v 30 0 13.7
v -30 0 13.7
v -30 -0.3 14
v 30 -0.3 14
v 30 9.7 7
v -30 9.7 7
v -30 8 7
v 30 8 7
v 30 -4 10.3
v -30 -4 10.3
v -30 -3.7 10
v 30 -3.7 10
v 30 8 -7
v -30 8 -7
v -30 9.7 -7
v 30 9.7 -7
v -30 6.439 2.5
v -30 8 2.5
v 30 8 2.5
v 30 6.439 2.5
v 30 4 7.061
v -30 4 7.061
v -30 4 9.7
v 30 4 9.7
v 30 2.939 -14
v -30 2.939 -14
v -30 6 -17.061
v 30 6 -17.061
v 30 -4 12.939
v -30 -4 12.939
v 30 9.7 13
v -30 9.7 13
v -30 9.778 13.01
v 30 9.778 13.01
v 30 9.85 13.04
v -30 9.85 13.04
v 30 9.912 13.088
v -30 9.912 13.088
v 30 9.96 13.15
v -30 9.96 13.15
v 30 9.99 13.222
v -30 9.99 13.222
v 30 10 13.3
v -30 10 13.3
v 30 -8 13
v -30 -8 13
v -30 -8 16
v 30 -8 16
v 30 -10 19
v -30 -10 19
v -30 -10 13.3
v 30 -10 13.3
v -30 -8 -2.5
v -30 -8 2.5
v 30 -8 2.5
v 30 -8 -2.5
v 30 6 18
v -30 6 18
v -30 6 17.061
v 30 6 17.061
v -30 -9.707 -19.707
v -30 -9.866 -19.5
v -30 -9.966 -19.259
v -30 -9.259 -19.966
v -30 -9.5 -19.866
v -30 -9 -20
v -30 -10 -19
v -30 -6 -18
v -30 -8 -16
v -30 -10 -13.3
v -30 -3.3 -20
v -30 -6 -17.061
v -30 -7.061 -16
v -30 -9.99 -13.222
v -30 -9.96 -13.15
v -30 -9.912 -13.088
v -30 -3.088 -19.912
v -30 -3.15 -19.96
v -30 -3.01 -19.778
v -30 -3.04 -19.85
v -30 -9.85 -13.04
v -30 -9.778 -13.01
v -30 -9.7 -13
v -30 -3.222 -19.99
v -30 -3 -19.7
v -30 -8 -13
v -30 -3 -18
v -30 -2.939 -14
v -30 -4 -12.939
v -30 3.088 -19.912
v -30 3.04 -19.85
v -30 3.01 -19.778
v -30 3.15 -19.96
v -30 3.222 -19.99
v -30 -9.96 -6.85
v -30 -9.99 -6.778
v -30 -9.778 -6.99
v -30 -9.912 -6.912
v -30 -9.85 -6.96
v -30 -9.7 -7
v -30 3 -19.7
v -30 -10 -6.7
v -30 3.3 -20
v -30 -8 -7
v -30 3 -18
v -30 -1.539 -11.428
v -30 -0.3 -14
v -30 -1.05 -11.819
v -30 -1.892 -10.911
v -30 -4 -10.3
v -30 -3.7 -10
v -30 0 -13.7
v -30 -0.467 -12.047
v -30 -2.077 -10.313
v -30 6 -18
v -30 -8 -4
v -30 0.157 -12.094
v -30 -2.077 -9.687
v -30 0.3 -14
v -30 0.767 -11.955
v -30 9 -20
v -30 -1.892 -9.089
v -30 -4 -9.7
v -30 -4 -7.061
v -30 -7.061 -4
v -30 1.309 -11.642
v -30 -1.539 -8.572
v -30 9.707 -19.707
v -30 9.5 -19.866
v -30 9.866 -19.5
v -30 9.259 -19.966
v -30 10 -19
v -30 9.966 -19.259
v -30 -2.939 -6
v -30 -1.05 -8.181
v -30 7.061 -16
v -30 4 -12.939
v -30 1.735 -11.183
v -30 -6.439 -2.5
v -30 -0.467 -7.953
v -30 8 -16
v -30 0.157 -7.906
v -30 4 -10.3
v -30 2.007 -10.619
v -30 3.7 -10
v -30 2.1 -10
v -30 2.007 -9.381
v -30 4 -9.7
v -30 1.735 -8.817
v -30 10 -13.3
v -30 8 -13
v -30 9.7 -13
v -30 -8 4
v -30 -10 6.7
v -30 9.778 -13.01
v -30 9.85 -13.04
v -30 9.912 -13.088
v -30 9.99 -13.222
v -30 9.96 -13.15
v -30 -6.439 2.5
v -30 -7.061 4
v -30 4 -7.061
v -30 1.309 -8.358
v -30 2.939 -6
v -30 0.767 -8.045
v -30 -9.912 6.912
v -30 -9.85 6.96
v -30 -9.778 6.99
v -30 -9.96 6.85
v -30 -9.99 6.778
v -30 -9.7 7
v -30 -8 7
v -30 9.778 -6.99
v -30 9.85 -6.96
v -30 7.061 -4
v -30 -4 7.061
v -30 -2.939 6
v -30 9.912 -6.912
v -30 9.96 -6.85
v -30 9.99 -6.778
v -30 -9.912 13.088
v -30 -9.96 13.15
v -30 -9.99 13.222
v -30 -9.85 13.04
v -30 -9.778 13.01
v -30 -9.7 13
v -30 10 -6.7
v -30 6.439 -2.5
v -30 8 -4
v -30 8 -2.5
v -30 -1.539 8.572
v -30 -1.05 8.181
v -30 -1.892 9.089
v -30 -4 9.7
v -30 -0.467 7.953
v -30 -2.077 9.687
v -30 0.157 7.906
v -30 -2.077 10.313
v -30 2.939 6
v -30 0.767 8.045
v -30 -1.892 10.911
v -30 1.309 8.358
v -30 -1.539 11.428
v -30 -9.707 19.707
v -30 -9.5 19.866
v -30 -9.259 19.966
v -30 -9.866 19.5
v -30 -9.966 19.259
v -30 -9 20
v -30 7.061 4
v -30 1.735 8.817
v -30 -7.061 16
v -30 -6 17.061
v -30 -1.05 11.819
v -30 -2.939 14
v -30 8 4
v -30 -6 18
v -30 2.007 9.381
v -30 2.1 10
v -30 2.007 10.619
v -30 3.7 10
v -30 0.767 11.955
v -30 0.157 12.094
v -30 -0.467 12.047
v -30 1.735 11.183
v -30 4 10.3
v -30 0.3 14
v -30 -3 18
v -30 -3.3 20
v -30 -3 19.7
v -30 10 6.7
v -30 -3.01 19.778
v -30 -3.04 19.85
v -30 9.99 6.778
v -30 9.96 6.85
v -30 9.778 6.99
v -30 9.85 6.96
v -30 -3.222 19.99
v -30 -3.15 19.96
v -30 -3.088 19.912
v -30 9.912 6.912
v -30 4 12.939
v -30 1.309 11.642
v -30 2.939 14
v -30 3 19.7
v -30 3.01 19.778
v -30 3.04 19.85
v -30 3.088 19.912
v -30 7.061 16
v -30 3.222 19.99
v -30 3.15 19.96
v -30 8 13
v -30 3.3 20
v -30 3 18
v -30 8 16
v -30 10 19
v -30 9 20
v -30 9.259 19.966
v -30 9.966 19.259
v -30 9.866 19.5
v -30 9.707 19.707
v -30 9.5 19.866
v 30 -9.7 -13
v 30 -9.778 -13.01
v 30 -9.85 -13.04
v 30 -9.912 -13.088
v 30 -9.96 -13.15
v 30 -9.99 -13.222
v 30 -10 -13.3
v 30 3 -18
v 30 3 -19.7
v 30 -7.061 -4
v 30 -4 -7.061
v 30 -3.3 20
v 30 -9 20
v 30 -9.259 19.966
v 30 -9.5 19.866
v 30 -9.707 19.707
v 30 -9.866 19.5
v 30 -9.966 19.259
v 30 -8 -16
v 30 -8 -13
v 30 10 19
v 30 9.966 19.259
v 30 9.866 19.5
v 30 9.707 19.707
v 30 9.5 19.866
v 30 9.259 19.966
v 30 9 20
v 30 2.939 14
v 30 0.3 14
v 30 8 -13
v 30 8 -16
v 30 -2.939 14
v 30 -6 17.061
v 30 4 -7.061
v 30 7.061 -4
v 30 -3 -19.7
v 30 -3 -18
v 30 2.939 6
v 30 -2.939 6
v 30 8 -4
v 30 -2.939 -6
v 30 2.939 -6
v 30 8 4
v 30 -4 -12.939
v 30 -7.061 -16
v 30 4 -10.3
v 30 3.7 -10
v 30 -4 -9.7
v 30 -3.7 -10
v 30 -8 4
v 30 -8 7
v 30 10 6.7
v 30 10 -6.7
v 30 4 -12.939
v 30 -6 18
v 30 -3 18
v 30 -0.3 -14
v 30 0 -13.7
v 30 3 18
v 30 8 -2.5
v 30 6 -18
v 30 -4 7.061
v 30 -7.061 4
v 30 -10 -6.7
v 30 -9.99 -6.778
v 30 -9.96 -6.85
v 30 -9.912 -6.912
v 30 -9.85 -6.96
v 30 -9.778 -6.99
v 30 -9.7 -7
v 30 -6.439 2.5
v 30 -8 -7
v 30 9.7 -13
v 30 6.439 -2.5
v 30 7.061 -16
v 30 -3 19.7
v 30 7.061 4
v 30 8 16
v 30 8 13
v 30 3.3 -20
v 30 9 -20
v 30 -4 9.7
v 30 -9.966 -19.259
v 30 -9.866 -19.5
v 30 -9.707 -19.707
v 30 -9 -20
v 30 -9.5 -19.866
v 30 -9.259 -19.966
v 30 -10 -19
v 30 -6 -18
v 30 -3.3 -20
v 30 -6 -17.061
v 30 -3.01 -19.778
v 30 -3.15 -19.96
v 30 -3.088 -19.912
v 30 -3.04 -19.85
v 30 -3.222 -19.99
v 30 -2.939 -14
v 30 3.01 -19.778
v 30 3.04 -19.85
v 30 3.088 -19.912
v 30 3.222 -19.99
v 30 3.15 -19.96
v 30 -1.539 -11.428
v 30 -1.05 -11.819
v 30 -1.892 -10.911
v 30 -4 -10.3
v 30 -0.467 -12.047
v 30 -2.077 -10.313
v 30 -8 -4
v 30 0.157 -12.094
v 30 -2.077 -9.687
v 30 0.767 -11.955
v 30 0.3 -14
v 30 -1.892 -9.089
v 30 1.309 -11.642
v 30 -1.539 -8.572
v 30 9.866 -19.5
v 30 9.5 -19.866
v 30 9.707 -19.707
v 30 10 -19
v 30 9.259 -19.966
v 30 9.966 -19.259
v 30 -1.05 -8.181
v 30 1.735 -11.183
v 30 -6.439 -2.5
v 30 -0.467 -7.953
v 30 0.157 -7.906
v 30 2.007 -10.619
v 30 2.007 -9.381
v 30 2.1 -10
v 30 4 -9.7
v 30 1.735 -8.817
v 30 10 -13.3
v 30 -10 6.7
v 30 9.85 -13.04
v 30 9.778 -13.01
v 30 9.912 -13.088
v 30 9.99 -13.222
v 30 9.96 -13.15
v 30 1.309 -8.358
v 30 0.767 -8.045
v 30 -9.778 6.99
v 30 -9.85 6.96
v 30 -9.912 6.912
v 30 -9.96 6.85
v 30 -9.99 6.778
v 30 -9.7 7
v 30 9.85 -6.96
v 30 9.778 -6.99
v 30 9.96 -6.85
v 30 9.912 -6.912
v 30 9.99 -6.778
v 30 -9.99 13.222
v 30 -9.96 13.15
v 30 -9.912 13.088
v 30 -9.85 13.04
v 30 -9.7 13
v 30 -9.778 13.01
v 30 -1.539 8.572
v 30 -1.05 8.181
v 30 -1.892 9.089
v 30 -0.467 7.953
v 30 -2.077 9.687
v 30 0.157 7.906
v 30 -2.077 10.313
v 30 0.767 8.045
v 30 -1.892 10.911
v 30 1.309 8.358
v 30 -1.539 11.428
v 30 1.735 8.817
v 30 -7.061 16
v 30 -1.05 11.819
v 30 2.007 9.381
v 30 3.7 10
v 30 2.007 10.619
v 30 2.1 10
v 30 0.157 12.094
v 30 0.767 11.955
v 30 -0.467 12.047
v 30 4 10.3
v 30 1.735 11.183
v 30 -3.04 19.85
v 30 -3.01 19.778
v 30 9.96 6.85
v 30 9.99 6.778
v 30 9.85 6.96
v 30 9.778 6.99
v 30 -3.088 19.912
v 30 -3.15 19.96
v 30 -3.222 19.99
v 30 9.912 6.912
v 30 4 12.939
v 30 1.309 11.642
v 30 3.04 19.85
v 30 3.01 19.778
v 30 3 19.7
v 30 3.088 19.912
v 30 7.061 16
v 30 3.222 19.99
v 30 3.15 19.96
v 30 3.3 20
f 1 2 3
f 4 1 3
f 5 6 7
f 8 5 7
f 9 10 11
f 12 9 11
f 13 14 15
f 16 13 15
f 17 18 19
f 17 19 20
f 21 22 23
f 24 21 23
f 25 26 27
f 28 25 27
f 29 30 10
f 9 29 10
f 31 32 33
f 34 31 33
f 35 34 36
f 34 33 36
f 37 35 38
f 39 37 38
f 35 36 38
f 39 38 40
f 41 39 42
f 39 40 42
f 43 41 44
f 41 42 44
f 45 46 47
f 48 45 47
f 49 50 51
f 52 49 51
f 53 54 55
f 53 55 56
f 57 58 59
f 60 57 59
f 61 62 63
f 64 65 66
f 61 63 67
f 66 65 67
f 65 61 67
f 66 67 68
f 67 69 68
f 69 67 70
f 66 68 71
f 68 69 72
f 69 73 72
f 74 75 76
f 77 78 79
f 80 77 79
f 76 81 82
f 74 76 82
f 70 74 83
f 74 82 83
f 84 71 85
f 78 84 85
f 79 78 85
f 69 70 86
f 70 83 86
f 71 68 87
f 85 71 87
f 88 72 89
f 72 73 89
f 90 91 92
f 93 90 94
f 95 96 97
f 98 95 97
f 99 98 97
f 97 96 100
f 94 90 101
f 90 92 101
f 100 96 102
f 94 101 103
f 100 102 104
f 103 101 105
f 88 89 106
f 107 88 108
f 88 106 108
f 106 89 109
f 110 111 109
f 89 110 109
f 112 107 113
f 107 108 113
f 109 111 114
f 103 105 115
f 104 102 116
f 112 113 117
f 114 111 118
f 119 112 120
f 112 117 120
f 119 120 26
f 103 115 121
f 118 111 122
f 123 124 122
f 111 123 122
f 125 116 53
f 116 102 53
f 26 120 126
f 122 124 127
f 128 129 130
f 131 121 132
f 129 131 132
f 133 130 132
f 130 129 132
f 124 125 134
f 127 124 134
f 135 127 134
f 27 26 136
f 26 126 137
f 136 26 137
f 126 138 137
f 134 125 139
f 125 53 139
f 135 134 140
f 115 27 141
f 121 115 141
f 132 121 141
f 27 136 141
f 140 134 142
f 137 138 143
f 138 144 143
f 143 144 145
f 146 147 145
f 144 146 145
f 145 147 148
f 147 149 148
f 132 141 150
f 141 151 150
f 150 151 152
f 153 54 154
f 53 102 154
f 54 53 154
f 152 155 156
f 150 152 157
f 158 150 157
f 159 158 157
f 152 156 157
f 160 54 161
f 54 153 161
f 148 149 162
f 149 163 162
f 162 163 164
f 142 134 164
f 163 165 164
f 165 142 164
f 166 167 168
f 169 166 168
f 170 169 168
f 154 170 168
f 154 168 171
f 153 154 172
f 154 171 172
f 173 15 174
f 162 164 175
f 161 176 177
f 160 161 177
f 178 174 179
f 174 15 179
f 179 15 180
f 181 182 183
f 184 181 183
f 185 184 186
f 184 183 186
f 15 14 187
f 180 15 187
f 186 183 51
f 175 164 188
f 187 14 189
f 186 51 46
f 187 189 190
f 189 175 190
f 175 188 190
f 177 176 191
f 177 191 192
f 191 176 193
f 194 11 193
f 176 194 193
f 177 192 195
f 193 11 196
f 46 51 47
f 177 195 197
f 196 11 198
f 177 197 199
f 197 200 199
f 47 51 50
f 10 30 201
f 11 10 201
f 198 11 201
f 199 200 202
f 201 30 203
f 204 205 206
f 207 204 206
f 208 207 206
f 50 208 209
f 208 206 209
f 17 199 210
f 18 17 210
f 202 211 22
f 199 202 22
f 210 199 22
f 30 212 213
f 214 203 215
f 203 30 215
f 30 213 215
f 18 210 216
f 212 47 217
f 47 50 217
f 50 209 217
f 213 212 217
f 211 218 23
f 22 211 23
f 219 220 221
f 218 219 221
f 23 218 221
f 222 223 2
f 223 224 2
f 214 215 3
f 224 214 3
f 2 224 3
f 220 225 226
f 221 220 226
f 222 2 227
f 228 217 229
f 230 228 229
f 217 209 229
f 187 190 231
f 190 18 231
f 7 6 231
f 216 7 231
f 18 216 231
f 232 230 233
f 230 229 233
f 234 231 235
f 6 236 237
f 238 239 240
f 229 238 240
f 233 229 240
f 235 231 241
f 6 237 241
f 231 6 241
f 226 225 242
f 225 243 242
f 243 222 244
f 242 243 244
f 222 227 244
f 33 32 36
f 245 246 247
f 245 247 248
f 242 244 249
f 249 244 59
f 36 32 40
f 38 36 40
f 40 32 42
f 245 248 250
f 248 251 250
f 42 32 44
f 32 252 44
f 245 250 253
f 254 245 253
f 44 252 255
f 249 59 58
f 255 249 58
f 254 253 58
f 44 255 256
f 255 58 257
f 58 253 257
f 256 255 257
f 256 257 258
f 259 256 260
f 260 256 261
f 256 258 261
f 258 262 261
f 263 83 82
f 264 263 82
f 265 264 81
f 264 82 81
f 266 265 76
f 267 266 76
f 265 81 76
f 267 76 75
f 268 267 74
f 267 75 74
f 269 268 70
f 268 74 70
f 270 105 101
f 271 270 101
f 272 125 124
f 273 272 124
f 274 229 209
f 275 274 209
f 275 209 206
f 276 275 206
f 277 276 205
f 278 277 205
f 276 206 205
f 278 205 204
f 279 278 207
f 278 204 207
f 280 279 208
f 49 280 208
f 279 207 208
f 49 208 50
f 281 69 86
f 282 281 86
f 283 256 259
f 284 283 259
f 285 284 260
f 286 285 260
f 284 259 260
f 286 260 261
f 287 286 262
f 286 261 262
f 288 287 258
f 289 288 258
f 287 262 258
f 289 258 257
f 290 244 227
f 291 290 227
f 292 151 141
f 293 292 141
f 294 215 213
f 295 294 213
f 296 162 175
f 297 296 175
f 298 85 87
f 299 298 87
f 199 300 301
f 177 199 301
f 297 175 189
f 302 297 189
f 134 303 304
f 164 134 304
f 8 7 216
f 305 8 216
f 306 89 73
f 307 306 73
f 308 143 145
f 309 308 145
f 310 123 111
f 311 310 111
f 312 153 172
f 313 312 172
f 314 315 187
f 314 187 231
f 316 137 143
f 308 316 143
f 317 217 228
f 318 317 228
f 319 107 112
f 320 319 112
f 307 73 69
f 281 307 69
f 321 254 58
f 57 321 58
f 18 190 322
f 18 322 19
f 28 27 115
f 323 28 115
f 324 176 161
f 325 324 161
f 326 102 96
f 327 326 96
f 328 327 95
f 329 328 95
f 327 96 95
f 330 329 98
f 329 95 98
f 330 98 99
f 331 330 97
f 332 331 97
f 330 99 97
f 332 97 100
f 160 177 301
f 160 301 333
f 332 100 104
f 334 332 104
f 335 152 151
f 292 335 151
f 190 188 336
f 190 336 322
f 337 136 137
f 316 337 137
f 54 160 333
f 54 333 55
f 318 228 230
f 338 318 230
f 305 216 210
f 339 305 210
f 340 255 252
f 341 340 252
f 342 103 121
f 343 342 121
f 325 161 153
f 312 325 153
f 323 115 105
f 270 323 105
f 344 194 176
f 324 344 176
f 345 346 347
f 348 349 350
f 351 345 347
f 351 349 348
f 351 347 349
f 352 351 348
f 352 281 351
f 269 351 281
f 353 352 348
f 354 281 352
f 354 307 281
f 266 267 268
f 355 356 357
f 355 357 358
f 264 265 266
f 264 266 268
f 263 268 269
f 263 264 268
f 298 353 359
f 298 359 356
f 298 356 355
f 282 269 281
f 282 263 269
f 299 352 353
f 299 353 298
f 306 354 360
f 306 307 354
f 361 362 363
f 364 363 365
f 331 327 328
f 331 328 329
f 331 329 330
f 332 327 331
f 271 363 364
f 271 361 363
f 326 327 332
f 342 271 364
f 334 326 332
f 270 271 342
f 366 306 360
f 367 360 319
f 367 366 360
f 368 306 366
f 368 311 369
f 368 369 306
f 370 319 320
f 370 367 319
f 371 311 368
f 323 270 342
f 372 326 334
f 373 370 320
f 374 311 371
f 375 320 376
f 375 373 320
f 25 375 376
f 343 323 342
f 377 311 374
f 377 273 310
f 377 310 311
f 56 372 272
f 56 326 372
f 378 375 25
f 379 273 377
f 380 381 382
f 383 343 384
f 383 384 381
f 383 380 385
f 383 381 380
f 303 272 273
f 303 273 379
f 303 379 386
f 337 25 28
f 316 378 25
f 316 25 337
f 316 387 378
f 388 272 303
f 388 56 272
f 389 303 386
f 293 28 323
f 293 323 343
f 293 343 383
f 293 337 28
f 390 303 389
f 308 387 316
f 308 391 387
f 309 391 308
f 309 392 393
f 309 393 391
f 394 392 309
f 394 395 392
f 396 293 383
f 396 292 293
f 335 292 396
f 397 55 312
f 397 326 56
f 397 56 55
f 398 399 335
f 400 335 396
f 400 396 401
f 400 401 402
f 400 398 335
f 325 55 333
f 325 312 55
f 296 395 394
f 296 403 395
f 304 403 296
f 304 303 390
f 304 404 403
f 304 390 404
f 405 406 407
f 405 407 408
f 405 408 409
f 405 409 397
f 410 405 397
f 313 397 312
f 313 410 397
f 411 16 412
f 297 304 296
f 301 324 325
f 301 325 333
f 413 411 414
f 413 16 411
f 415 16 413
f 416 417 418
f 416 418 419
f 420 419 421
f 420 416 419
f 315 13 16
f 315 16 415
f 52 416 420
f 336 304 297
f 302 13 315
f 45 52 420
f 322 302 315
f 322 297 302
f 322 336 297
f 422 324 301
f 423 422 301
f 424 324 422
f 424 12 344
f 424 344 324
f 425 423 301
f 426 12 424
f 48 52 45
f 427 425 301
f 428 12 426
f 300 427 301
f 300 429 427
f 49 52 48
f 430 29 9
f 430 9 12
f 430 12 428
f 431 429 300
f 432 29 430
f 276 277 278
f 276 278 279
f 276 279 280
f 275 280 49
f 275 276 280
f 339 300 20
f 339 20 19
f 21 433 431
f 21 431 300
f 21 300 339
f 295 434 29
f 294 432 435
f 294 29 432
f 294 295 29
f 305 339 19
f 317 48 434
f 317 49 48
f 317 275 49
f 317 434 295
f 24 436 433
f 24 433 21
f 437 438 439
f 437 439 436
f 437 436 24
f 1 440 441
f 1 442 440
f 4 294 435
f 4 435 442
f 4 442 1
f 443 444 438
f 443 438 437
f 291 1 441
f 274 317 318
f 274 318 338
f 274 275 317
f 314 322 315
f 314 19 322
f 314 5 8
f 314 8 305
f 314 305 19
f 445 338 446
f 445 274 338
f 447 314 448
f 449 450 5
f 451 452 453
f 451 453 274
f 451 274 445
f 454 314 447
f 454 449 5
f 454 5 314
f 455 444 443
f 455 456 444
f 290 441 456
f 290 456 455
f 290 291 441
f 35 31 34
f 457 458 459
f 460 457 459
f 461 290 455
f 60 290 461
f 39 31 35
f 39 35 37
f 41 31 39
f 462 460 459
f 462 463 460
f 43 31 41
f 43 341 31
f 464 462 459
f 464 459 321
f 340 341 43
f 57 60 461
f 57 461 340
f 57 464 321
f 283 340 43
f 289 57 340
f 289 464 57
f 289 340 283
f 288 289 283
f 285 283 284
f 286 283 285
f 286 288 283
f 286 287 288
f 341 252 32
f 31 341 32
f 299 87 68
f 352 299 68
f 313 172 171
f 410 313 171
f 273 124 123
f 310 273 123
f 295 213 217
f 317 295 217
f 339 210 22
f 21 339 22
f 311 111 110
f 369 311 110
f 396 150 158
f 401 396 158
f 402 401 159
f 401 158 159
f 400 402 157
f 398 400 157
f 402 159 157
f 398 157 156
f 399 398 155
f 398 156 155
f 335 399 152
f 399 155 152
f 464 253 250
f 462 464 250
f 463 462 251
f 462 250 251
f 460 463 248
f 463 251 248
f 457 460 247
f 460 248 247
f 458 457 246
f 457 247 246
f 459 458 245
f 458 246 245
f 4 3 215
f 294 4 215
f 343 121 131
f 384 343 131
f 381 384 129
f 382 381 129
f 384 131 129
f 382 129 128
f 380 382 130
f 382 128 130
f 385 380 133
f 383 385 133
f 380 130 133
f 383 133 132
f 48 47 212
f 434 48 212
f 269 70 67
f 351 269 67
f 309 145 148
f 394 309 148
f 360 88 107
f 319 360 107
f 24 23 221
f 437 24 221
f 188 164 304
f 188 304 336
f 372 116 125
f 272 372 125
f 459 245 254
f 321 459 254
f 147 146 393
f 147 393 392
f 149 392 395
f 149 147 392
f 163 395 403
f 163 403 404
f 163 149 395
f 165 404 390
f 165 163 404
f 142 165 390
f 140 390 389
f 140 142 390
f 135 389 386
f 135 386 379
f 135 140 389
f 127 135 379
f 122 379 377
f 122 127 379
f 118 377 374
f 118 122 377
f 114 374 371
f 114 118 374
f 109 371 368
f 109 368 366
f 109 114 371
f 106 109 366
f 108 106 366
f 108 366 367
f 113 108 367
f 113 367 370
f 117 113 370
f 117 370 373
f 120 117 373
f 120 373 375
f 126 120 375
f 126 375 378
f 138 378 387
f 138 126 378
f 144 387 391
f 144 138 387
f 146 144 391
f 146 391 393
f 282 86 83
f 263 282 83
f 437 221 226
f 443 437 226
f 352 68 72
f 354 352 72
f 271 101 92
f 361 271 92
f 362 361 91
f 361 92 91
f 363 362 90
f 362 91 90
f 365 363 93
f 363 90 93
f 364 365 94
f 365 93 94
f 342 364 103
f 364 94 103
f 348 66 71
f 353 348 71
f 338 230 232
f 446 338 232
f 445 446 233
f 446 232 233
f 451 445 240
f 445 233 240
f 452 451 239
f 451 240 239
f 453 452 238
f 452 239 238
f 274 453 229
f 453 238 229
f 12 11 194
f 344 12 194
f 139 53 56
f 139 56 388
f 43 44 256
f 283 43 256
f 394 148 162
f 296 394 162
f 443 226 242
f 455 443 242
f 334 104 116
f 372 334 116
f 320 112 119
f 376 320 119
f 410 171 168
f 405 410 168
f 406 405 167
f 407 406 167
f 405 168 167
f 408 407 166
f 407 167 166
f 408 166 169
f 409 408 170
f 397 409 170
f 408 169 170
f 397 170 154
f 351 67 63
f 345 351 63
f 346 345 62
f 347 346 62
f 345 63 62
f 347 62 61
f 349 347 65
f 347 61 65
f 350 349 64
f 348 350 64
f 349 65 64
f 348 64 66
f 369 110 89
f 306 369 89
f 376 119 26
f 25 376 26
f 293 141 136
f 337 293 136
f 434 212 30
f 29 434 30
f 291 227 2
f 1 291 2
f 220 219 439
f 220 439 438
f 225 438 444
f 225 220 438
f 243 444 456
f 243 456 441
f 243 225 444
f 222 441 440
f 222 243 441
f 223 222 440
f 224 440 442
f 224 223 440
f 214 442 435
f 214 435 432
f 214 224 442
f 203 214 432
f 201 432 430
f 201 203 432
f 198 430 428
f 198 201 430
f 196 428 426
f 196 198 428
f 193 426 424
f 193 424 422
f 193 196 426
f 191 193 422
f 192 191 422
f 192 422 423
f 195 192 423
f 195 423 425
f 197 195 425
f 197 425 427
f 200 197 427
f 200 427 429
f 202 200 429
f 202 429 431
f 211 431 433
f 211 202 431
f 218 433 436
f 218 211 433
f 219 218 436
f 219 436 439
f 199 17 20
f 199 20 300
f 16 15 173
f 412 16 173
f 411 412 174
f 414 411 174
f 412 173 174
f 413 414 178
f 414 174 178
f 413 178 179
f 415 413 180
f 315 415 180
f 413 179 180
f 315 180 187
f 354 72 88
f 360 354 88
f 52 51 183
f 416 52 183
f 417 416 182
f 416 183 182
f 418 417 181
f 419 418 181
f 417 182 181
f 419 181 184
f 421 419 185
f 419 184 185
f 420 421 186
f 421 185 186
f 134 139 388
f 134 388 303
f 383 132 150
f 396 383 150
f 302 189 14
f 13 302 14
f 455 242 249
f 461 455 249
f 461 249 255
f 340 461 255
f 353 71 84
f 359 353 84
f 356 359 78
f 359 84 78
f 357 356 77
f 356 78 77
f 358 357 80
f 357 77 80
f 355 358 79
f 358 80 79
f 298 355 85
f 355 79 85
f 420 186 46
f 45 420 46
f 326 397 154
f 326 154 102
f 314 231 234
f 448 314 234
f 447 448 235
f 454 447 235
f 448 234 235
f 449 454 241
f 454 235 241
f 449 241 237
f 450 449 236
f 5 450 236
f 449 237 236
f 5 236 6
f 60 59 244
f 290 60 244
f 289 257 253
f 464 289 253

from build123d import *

# Parameters (mm, degrees)
SKETCH11_R               = 2.1
STRUCTURAL_MEMBER1_DEPTH = 60


with BuildPart() as part:
    # Sketch11 → Structural Member1 (new body)
    with BuildSketch(Plane.YZ.offset(-30)):
        with BuildLine():
            Line((-9, -20), (-3.3, -20))
            ThreePointArc((-3.3, -20), (-3.087867966, -19.912132034), (-3, -19.7))
            Line((-3, -19.7), (-3, -18))
            Line((-3, -18), (-6, -18))
            Line((-6, -18), (-6, -17.060660172))
            Line((-6, -17.060660172), (-2.939339828, -14))
            Line((-2.939339828, -14), (-0.3, -14))
            Line((-0.3, -14), (0, -13.7))
            Line((0, -13.7), (0.3, -14))
            Line((0.3, -14), (2.939339828, -14))
            Line((2.939339828, -14), (6, -17.060660172))
            Line((6, -17.060660172), (6, -18))
            Line((6, -18), (3, -18))
            Line((3, -18), (3, -19.7))
            ThreePointArc((3, -19.7), (3.087867966, -19.912132034), (3.3, -20))
            Line((3.3, -20), (9, -20))
            ThreePointArc((9, -20), (9.707106781, -19.707106781), (10, -19))
            Line((10, -19), (10, -13.3))
            ThreePointArc((10, -13.3), (9.912132034, -13.087867966), (9.7, -13))
            Line((9.7, -13), (8, -13))
            Line((8, -13), (8, -16))
            Line((8, -16), (7.060660172, -16))
            Line((7.060660172, -16), (4, -12.939339828))
            Line((4, -12.939339828), (4, -10.3))
            Line((4, -10.3), (3.7, -10))
            Line((3.7, -10), (4, -9.7))
            Line((4, -9.7), (4, -7.060660172))
            Line((4, -7.060660172), (7.060660172, -4))
            Line((7.060660172, -4), (8, -4))
            Line((8, -4), (8, -7))
            Line((8, -7), (9.7, -7))
            ThreePointArc((9.7, -7), (9.912132034, -6.912132034), (10, -6.7))
            Line((10, -6.7), (10, 6.7))
            ThreePointArc((10, 6.7), (9.912132034, 6.912132034), (9.7, 7))
            Line((9.7, 7), (8, 7))
            Line((8, 7), (8, 4))
            Line((8, 4), (7.060660172, 4))
            Line((7.060660172, 4), (4, 7.060660172))
            Line((4, 7.060660172), (4, 9.7))
            Line((4, 9.7), (3.7, 10))
            Line((3.7, 10), (4, 10.3))
            Line((4, 10.3), (4, 12.939339828))
            Line((4, 12.939339828), (7.060660172, 16))
            Line((7.060660172, 16), (8, 16))
            Line((8, 16), (8, 13))
            Line((8, 13), (9.7, 13))
            ThreePointArc((9.7, 13), (9.912132034, 13.087867966), (10, 13.3))
            Line((10, 13.3), (10, 19))
            ThreePointArc((10, 19), (9.707106781, 19.707106781), (9, 20))
            Line((9, 20), (3.3, 20))
            ThreePointArc((3.3, 20), (3.087867966, 19.912132034), (3, 19.7))
            Line((3, 19.7), (3, 18))
            Line((3, 18), (6, 18))
            Line((6, 18), (6, 17.060660172))
            Line((6, 17.060660172), (2.939339828, 14))
            Line((2.939339828, 14), (0.3, 14))
            Line((0.3, 14), (0, 13.7))
            Line((0, 13.7), (-0.3, 14))
            Line((-0.3, 14), (-2.939339828, 14))
            Line((-2.939339828, 14), (-6, 17.060660172))
            Line((-6, 17.060660172), (-6, 18))
            Line((-6, 18), (-3, 18))
            Line((-3, 18), (-3, 19.7))
            ThreePointArc((-3, 19.7), (-3.087867966, 19.912132034), (-3.3, 20))
            Line((-3.3, 20), (-9, 20))
            ThreePointArc((-9, 20), (-9.707106781, 19.707106781), (-10, 19))
            Line((-10, 19), (-10, 13.3))
            ThreePointArc((-10, 13.3), (-9.912132034, 13.087867966), (-9.7, 13))
            Line((-9.7, 13), (-8, 13))
            Line((-8, 13), (-8, 16))
            Line((-8, 16), (-7.060660172, 16))
            Line((-7.060660172, 16), (-4, 12.939339828))
            Line((-4, 12.939339828), (-4, 10.3))
            Line((-4, 10.3), (-3.7, 10))
            Line((-3.7, 10), (-4, 9.7))
            Line((-4, 9.7), (-4, 7.060660172))
            Line((-4, 7.060660172), (-7.060660172, 4))
            Line((-7.060660172, 4), (-8, 4))
            Line((-8, 4), (-8, 7))
            Line((-8, 7), (-9.7, 7))
            ThreePointArc((-9.7, 7), (-9.912132034, 6.912132034), (-10, 6.7))
            Line((-10, 6.7), (-10, -6.7))
            ThreePointArc((-10, -6.7), (-9.912132034, -6.912132034), (-9.7, -7))
            Line((-9.7, -7), (-8, -7))
            Line((-8, -7), (-8, -4))
            Line((-8, -4), (-7.060660172, -4))
            Line((-7.060660172, -4), (-4, -7.060660172))
            Line((-4, -7.060660172), (-4, -9.7))
            Line((-4, -9.7), (-3.7, -10))
            Line((-3.7, -10), (-4, -10.3))
            Line((-4, -10.3), (-4, -12.939339828))
            Line((-4, -12.939339828), (-7.060660172, -16))
            Line((-7.060660172, -16), (-8, -16))
            Line((-8, -16), (-8, -13))
            Line((-8, -13), (-9.7, -13))
            ThreePointArc((-9.7, -13), (-9.912132034, -13.087867966), (-10, -13.3))
            Line((-10, -13.3), (-10, -19))
            ThreePointArc((-10, -19), (-9.707106781, -19.707106781), (-9, -20))
        make_face()
        with Locations((0, 10)):
            Circle(SKETCH11_R, mode=Mode.SUBTRACT)
        with Locations((0, -10)):
            Circle(SKETCH11_R, mode=Mode.SUBTRACT)
        Polygon((-8, -2.5), (-6.439339828, -2.5), (-2.939339828, -6), (2.939339828, -6), (6.439339828, -2.5), (8, -2.5), (8, 2.5), (6.439339828, 2.5), (2.939339828, 6), (-2.939339828, 6), (-6.439339828, 2.5), (-8, 2.5), align=None, mode=Mode.SUBTRACT)
    extrude(amount=STRUCTURAL_MEMBER1_DEPTH)


solid = part.part
